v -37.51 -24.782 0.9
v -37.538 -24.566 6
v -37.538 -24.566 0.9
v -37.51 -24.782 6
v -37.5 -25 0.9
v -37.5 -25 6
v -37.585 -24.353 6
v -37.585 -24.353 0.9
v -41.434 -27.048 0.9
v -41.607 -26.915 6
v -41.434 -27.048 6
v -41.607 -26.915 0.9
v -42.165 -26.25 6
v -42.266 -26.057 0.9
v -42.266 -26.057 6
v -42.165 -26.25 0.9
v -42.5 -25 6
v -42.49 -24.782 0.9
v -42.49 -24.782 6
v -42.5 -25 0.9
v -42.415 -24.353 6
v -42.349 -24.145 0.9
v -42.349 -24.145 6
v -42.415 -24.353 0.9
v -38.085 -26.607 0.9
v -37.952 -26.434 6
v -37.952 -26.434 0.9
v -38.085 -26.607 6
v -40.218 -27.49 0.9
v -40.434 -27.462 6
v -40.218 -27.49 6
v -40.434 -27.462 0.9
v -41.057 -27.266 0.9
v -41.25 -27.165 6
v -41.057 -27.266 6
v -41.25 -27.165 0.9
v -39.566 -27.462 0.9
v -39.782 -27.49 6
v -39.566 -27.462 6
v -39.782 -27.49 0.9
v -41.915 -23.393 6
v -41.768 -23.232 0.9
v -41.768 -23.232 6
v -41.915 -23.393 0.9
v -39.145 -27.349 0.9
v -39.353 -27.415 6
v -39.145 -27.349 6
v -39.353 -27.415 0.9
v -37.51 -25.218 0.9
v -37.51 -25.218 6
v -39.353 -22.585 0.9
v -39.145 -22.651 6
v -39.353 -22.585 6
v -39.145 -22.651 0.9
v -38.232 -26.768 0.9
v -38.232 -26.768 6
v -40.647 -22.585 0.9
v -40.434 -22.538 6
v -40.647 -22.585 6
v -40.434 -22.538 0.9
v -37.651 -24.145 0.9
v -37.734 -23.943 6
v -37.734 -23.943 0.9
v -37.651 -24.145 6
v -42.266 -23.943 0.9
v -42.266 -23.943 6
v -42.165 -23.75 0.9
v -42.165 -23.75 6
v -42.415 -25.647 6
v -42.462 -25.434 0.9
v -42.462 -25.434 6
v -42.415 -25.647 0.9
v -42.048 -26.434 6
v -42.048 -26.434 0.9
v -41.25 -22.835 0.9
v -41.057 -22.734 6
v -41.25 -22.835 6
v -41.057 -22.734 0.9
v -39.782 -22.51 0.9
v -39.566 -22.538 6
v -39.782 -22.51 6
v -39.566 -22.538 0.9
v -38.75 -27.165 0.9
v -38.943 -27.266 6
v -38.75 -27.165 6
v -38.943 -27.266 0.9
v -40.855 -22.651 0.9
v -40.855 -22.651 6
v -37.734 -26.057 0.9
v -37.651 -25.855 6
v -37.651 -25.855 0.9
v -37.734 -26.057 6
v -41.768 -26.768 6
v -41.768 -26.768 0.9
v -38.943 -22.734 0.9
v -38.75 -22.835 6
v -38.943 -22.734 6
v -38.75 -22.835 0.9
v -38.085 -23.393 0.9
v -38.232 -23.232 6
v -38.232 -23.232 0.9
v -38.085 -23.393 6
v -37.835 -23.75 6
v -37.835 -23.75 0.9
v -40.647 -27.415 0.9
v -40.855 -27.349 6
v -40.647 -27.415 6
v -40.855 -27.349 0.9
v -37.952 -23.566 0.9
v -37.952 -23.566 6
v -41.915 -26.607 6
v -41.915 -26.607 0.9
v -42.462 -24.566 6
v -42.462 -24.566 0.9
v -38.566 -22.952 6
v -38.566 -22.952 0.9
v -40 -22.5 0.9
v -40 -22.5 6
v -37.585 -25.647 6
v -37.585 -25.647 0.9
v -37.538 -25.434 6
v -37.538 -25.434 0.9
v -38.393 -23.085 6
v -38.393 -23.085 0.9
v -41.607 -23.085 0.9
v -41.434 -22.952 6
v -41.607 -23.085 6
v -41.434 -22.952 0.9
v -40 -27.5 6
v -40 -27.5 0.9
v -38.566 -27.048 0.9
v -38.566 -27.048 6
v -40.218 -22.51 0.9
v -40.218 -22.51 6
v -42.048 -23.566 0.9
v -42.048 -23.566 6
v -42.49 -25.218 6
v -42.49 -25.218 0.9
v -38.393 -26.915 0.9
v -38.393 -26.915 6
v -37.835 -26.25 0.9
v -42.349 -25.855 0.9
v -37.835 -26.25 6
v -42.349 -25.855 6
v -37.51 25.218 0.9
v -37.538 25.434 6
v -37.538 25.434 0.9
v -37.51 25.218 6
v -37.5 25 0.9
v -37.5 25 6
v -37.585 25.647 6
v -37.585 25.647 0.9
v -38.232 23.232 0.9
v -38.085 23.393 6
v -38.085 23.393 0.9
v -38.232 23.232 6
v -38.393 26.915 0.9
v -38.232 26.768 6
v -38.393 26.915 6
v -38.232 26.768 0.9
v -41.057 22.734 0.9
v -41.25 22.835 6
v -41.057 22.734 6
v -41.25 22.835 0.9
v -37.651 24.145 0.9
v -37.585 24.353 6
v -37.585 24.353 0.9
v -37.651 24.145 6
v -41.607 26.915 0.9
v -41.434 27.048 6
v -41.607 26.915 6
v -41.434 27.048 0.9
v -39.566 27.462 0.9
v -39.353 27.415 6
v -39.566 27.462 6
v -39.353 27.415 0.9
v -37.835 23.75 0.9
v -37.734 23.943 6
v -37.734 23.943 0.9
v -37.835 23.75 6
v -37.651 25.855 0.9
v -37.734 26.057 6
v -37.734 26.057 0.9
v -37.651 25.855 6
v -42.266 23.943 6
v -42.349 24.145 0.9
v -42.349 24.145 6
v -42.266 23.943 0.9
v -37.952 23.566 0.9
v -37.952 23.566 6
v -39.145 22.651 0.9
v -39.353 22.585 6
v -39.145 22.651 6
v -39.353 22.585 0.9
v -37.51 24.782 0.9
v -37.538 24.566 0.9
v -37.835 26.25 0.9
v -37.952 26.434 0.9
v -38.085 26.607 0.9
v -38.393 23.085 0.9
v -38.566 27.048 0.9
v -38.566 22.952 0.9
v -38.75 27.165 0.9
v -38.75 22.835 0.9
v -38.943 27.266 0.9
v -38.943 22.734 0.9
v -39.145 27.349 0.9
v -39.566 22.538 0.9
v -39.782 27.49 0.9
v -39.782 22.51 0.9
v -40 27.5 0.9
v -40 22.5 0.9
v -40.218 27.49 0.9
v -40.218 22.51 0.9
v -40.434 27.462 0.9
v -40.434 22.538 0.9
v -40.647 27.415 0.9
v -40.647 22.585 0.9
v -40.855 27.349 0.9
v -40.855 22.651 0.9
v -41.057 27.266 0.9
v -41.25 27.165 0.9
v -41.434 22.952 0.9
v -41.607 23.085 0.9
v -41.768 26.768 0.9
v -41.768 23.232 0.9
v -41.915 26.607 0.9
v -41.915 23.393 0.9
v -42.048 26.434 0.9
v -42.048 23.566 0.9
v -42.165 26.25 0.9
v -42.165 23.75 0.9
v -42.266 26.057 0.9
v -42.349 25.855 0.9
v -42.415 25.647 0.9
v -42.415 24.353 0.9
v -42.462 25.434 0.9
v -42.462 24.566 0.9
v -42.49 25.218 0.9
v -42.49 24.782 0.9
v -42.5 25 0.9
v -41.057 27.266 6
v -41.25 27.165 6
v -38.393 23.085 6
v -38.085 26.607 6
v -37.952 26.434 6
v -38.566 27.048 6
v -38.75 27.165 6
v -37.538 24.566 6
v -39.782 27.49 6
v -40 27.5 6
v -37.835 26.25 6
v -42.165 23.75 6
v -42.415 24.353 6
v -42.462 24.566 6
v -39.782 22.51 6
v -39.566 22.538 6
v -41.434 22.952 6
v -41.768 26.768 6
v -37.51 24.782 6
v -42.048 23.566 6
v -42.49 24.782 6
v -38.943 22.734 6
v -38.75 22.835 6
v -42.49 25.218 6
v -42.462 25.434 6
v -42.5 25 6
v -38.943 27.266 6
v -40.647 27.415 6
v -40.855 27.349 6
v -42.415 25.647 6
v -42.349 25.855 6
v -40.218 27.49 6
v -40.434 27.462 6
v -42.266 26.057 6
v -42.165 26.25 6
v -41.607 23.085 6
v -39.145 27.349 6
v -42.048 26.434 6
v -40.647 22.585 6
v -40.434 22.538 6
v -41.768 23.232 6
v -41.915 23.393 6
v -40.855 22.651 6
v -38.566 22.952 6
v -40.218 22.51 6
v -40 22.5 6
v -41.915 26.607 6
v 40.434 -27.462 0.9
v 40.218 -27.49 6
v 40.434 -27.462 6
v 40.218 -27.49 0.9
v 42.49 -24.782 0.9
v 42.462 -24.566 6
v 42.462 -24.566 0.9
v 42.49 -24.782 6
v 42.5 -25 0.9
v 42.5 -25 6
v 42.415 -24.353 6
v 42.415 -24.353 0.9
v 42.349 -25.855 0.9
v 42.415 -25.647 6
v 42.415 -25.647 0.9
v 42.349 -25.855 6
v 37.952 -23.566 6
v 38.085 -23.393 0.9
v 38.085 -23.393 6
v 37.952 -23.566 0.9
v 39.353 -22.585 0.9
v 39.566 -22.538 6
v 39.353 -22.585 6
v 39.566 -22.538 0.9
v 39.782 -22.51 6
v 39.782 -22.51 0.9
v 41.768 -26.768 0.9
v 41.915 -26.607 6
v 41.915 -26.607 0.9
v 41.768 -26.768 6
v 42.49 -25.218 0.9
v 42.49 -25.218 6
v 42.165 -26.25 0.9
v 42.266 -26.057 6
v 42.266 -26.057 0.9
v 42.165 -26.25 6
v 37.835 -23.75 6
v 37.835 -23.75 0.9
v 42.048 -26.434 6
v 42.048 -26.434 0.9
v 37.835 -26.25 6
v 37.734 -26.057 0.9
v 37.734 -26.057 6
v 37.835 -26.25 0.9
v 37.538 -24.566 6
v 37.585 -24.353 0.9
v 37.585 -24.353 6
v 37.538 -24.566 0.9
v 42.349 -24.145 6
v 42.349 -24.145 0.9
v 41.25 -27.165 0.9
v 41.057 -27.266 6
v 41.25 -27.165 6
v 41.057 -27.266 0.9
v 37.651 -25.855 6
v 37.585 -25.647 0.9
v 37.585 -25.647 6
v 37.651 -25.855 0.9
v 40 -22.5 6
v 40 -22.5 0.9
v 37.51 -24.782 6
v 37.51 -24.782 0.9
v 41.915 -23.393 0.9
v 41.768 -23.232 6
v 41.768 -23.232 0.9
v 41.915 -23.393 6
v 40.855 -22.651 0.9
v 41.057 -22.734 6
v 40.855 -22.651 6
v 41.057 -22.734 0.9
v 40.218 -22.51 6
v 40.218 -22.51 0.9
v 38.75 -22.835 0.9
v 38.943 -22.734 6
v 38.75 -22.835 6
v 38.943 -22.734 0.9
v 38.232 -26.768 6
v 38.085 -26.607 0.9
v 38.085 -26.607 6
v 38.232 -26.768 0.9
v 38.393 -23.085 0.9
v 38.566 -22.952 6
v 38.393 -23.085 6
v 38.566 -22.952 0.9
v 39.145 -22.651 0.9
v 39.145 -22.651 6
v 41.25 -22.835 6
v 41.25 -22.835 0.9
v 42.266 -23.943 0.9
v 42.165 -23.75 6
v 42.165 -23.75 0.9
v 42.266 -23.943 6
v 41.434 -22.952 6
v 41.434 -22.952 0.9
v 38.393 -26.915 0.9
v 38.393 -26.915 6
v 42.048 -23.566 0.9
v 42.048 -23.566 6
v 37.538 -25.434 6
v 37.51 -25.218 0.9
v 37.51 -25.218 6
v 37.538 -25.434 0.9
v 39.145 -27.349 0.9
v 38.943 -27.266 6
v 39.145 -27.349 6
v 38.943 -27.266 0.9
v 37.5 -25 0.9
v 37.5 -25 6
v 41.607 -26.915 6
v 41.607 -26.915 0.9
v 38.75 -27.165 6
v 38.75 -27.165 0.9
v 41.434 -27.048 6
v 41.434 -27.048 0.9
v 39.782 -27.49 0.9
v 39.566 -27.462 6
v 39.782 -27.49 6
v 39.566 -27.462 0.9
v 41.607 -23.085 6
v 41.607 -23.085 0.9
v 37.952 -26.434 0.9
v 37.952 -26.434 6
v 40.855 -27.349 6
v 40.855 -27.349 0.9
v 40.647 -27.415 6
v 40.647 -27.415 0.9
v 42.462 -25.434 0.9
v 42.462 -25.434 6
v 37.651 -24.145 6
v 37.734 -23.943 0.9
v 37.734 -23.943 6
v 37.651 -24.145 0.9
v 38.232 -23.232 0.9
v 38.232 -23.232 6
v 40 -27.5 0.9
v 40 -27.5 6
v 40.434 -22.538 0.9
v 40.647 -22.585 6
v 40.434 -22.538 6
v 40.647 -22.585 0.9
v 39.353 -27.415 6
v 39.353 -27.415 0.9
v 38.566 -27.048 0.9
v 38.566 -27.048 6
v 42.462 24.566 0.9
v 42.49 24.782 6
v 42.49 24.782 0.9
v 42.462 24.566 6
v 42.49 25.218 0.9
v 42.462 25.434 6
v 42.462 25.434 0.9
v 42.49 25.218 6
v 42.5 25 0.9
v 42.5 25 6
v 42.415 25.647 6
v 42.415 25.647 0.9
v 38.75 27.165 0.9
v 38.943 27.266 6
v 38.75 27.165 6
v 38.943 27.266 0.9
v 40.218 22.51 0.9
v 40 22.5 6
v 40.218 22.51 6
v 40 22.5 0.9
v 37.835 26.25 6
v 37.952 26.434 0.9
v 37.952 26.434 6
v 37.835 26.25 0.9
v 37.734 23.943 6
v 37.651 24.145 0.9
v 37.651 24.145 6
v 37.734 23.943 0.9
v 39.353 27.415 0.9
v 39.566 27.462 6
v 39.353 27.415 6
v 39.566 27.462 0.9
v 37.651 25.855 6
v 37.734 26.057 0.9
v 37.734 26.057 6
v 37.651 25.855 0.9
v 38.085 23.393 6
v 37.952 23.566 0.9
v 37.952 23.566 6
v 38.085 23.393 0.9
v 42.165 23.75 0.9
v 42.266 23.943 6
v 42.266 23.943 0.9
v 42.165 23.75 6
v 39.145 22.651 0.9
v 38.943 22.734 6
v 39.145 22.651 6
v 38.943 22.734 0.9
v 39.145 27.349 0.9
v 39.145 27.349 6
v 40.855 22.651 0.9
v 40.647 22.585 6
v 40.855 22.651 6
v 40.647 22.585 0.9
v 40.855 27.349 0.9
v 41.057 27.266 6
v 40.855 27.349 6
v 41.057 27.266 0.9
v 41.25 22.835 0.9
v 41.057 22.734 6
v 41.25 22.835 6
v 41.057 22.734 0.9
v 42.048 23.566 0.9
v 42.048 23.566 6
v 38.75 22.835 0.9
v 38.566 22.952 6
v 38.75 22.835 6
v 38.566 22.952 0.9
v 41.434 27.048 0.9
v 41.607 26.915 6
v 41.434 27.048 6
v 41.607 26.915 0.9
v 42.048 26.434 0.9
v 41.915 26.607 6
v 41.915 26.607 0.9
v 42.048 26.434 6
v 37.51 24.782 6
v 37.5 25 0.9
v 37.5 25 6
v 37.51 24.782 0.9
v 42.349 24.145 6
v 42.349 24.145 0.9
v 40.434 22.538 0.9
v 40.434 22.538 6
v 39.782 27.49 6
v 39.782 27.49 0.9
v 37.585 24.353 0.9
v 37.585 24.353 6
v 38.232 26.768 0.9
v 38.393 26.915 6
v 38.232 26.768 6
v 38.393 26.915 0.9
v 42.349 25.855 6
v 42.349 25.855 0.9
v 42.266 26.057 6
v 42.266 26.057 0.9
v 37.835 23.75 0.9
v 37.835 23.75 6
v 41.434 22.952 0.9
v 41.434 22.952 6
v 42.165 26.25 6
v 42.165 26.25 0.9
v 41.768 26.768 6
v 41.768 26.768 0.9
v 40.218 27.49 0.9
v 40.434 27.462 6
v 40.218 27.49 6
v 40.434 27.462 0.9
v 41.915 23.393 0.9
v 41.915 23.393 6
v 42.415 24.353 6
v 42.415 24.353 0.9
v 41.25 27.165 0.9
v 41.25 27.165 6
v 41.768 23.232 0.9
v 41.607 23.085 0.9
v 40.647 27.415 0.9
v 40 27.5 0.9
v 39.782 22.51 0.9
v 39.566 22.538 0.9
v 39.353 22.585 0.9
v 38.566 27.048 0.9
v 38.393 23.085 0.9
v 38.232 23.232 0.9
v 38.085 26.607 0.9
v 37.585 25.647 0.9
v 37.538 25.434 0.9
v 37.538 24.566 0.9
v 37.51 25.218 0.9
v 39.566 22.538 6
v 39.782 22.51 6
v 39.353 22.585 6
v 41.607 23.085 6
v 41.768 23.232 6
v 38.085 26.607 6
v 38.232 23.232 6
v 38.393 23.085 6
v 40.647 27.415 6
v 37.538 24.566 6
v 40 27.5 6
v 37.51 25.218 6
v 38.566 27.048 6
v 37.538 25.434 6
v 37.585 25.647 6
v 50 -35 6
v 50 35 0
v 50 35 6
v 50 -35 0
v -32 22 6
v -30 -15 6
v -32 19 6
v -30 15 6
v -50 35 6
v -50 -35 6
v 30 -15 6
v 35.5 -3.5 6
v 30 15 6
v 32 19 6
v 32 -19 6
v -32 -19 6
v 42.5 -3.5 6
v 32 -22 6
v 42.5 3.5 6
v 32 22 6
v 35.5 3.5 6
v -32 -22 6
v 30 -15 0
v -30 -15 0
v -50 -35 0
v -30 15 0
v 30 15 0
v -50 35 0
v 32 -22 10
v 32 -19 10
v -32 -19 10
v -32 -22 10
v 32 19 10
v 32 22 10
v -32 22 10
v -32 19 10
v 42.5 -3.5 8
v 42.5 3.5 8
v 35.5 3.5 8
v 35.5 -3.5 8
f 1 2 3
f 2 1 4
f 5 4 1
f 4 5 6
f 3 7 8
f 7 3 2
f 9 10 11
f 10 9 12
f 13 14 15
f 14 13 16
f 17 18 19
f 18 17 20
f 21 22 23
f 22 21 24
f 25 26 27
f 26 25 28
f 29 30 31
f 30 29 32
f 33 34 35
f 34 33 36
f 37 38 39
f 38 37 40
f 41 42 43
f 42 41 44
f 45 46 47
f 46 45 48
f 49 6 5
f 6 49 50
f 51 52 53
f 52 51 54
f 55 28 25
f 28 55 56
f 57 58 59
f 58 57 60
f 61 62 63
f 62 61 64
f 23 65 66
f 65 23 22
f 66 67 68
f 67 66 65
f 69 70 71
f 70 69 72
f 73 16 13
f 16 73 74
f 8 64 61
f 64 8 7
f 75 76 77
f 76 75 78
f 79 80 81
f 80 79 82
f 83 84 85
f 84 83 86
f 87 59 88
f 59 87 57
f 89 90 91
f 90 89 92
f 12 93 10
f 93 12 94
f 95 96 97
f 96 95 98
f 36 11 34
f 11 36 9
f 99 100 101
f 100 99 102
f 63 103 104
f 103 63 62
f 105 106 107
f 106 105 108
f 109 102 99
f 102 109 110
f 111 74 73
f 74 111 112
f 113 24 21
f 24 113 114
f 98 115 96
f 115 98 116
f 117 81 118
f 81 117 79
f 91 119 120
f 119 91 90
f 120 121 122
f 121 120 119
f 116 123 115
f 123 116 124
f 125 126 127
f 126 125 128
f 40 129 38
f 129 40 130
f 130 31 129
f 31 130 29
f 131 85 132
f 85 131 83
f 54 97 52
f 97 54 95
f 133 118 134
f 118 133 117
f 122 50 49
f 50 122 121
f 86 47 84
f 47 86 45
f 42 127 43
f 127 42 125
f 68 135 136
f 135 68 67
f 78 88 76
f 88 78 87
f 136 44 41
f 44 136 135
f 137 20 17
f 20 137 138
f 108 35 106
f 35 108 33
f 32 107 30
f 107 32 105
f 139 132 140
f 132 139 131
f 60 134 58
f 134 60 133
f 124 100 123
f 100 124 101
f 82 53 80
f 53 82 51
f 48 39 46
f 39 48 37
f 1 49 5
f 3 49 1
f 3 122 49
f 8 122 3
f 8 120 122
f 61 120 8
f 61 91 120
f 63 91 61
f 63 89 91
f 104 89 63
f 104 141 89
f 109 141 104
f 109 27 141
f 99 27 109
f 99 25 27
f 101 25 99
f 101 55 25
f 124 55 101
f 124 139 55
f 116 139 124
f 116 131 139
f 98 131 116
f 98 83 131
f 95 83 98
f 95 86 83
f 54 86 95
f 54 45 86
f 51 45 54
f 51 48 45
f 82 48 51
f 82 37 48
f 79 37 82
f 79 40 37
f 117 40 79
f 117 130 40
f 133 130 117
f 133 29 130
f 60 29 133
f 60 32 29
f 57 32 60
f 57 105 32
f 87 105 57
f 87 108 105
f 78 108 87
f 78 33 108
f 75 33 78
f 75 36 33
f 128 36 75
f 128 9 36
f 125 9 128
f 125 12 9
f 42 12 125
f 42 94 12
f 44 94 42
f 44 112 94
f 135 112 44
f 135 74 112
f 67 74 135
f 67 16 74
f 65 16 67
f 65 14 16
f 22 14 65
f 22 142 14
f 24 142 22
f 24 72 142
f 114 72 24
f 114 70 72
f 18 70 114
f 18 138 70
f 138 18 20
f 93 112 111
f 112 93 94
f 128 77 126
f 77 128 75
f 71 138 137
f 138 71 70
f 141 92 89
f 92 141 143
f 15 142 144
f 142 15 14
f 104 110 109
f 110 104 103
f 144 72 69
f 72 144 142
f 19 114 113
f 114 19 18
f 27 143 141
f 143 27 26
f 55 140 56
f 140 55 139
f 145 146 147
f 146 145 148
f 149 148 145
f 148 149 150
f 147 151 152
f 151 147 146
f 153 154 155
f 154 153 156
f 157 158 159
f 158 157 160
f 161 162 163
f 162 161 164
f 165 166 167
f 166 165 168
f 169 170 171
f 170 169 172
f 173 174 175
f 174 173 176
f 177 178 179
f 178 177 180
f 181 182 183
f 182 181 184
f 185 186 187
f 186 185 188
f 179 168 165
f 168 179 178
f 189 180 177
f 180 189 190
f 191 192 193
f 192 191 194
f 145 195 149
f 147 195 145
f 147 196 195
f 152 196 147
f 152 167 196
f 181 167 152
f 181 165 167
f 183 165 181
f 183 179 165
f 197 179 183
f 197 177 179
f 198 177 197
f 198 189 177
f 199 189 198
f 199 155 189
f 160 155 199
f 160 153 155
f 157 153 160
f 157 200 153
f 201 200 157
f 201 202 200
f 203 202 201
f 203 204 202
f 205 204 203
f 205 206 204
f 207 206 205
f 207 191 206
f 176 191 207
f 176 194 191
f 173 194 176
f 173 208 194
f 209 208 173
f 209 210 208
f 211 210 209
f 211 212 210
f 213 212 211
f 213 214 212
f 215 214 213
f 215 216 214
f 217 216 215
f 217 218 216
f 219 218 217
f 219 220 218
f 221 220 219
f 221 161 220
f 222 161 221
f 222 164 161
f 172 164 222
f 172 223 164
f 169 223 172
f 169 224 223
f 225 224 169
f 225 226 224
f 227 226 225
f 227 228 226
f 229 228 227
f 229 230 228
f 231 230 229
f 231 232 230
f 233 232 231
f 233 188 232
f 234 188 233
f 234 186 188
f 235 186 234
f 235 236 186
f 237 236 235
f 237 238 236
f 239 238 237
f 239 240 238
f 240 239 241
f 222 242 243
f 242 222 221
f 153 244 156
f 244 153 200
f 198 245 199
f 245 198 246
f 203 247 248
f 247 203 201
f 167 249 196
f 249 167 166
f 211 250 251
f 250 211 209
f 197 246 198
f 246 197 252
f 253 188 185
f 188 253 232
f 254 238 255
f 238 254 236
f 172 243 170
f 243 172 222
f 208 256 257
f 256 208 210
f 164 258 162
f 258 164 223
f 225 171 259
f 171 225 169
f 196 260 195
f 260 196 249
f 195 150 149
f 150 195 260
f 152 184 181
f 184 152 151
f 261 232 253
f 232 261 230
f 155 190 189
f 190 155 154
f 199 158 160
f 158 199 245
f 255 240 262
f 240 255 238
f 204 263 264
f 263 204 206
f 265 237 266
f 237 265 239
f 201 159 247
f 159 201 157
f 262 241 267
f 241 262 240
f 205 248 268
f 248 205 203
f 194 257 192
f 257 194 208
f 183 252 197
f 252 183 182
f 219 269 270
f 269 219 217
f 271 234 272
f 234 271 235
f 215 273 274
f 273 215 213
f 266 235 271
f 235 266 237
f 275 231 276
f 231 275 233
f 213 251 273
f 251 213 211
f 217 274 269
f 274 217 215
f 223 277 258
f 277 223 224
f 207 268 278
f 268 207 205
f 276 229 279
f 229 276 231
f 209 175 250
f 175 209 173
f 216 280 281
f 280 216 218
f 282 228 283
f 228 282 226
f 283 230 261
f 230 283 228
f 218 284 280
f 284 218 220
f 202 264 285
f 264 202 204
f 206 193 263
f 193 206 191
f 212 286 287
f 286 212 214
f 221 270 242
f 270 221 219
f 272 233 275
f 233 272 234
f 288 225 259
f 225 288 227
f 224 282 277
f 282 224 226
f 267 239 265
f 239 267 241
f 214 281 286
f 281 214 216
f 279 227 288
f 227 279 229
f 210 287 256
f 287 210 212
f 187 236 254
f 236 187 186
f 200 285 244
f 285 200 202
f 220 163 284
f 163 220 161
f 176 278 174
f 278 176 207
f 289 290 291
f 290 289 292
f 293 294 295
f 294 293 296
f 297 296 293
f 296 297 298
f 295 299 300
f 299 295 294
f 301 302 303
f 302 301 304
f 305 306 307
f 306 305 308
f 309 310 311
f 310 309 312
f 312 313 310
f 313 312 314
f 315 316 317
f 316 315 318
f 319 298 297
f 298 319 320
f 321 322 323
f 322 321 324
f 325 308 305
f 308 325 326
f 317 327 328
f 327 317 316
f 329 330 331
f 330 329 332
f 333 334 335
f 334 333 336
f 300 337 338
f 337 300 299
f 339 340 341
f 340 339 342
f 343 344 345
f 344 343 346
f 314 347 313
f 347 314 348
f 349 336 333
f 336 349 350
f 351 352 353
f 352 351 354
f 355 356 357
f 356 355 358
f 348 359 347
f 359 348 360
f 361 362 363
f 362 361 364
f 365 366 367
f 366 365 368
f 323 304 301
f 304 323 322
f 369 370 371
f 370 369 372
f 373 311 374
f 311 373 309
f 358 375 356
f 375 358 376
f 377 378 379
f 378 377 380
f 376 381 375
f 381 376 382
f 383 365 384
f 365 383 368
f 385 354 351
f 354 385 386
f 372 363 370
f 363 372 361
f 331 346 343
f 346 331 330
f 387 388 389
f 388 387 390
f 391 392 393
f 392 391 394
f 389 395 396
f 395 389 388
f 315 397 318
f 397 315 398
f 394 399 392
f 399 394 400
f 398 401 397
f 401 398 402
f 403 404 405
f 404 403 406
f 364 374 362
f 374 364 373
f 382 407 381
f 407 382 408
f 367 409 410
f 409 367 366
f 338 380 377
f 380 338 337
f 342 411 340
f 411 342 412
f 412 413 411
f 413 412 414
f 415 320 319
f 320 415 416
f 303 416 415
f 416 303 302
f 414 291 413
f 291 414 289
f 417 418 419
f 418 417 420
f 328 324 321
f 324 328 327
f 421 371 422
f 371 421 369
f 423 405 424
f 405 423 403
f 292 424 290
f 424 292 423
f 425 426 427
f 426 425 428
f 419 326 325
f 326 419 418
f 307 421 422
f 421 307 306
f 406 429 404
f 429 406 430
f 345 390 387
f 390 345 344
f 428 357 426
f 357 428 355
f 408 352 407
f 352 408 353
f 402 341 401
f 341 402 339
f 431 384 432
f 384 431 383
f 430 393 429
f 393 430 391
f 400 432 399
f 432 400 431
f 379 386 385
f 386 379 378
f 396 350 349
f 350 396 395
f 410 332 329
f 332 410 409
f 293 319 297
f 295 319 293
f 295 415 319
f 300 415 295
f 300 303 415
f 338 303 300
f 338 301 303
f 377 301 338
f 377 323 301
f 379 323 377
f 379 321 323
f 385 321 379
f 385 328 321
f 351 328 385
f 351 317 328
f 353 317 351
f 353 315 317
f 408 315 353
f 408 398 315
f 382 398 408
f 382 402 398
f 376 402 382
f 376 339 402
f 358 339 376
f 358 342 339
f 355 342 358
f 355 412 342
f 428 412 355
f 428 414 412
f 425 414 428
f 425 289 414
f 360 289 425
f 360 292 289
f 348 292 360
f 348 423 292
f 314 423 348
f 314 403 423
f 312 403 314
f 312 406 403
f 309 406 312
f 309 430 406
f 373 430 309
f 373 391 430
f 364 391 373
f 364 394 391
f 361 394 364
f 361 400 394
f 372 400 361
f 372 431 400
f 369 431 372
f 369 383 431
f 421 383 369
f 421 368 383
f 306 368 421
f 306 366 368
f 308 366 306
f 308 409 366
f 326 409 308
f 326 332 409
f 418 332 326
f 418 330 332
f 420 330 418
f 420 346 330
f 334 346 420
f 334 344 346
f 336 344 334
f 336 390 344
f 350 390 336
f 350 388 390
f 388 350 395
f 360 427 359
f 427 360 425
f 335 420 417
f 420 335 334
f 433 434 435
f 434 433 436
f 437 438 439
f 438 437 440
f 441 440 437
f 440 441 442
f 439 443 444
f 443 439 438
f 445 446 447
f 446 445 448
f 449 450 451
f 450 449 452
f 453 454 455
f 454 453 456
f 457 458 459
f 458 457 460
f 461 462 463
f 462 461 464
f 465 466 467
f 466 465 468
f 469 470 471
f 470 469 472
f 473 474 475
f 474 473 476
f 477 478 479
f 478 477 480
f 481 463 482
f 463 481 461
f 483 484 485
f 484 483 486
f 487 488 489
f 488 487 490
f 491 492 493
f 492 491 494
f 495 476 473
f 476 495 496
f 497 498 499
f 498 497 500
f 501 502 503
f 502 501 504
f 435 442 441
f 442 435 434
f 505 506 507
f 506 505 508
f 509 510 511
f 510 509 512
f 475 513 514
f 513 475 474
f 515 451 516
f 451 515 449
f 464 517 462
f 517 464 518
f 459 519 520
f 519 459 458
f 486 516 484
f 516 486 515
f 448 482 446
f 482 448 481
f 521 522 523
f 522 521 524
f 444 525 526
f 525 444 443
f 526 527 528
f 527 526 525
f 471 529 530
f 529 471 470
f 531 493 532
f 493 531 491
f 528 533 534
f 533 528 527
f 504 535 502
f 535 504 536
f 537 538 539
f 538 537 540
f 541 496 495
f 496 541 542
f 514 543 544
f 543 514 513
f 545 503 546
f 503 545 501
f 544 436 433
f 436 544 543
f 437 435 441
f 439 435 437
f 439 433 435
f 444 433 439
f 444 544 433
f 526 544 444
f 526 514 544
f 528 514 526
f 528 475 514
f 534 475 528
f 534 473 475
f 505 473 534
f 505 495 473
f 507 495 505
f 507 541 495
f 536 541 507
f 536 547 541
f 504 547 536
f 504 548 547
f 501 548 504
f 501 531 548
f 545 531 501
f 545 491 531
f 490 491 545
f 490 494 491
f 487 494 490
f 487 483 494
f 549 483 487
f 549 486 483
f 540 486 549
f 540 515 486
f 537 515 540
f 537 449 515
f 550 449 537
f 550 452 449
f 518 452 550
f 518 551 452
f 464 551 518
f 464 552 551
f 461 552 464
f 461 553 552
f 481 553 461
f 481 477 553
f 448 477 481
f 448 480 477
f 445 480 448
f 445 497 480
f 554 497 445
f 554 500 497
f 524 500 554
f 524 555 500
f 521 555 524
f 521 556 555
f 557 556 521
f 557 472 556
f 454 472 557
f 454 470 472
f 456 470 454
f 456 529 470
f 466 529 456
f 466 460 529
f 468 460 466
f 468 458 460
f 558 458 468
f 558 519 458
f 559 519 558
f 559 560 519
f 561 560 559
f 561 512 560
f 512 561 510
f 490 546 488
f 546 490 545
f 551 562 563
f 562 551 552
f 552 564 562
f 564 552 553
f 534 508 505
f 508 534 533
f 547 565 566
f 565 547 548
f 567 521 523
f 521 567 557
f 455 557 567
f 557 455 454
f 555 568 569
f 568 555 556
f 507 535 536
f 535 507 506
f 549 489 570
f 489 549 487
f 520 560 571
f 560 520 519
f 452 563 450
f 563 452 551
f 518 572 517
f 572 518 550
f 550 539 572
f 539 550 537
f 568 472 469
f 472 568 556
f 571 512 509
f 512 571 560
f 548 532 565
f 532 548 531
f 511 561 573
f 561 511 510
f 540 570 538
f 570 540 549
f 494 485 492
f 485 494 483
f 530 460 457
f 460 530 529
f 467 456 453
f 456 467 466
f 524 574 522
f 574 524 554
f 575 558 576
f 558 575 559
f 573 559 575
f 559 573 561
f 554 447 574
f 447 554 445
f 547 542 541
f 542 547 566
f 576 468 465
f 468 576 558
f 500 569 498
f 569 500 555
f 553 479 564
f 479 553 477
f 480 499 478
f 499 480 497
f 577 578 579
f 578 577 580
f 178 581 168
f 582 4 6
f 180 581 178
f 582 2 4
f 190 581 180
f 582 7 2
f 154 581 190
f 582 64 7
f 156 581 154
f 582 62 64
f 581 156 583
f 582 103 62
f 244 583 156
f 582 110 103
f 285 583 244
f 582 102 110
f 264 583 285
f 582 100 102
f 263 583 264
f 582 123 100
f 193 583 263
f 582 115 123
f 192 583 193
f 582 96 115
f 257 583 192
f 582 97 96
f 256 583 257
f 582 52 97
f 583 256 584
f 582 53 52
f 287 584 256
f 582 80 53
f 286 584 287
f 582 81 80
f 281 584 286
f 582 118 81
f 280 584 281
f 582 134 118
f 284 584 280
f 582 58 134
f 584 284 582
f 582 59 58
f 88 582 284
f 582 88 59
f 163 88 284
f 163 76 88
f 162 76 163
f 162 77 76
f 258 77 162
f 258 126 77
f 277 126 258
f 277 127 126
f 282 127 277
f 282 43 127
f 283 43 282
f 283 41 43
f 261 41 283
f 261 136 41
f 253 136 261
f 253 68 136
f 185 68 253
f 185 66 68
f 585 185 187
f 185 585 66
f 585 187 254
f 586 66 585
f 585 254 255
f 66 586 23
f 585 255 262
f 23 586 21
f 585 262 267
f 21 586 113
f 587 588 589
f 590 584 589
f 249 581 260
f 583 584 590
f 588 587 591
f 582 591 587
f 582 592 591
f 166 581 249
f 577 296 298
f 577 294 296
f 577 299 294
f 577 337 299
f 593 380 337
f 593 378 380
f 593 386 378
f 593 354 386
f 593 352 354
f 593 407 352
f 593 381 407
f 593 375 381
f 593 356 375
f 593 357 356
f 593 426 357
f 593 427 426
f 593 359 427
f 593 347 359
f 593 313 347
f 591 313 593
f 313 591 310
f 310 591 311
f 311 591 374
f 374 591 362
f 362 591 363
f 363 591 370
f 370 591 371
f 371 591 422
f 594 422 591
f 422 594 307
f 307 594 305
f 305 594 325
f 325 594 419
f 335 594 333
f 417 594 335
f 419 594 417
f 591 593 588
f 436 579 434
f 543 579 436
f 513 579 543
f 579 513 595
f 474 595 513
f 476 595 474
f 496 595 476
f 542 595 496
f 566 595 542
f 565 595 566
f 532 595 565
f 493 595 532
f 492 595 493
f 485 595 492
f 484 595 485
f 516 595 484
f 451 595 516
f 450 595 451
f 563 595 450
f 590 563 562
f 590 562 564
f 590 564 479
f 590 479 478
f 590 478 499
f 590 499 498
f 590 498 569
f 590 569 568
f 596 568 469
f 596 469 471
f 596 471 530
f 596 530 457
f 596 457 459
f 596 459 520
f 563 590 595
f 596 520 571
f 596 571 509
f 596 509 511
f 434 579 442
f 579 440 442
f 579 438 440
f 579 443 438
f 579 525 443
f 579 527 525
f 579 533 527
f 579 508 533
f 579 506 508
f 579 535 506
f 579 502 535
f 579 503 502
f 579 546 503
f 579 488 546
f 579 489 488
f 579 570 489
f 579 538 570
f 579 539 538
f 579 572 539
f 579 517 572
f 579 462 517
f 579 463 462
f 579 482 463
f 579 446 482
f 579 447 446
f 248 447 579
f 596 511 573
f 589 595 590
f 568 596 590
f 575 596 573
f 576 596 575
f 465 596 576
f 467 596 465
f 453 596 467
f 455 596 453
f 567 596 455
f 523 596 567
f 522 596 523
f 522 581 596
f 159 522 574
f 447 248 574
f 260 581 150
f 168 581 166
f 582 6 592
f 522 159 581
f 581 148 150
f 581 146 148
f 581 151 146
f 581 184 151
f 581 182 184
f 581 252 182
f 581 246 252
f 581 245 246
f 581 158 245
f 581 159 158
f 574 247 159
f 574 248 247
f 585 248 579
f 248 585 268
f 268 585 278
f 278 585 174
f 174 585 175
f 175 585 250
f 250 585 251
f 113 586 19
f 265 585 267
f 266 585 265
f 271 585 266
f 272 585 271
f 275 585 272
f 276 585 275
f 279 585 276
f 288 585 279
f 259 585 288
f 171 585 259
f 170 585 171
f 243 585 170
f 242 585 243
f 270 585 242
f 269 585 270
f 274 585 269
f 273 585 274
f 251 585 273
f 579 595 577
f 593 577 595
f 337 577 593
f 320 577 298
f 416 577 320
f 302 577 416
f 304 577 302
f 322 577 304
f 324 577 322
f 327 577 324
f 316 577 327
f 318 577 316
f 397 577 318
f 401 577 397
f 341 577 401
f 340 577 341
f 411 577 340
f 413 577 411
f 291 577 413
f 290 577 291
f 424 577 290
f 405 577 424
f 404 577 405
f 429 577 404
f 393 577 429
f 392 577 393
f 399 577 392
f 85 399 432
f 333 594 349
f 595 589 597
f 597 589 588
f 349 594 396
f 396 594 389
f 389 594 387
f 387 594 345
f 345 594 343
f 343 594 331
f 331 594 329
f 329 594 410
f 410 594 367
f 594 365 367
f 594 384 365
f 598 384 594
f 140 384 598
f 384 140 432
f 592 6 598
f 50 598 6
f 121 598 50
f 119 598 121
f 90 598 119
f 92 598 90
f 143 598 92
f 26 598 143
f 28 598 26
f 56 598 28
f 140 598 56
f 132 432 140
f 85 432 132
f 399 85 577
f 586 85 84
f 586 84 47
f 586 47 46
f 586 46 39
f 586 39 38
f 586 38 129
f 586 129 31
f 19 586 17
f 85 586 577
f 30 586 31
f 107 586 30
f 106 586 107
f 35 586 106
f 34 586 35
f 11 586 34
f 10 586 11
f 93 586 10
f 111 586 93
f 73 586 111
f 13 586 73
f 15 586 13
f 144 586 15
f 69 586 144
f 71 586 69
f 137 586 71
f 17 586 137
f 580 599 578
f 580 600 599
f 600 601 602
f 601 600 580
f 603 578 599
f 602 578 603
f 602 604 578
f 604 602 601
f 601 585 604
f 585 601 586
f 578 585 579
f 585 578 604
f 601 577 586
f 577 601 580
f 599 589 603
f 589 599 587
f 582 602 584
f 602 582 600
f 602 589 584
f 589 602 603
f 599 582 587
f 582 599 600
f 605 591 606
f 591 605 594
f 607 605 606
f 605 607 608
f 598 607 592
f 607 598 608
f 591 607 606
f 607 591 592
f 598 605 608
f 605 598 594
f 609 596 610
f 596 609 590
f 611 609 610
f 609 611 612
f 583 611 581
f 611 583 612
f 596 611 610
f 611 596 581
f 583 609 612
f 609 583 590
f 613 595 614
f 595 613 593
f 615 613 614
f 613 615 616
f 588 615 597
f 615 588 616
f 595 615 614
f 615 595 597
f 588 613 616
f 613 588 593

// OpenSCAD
// Microfluidic chip imaging holder — reference solution
// Category: tools; purpose: repeatable positioning during optical chip imaging
// Print on flat base with z=0 on bed; PLA/PETG, no supports; not certified for clinical or sterile use
// SPDX-License-Identifier: CERN-OHL-P-2.0
$fn=72;
eps=0.05;
base_x=100;
base_y=70;
base_h=6;
window_x=60;
window_y=30;
hole_d=5;
hole_pitch_x=80;
hole_pitch_y=50;
rail_len=64;
rail_width=3;
rail_h=4;
rail_center_y=20.5;
marker_x=7;
marker_y=7;
marker_h=2;
marker_center_x=39;
assert(base_x > window_x + 2*hole_d);
assert(base_y > window_y + 2*hole_d);
assert(hole_pitch_x/2+hole_d/2 < base_x/2);
assert(hole_pitch_y/2+hole_d/2 < base_y/2);
assert(rail_center_y - rail_width/2 > window_y/2);
module reference(){
 union(){
  difference(){
   translate([-base_x/2,-base_y/2,0]) cube([base_x,base_y,base_h]);
   translate([-window_x/2,-window_y/2,-eps]) cube([window_x,window_y,base_h+2*eps]);
   for(x=[-hole_pitch_x/2,hole_pitch_x/2])
    for(y=[-hole_pitch_y/2,hole_pitch_y/2])
     translate([x,y,0.9]) cylinder(d=hole_d,h=base_h+2*eps);
  }
  for(y=[-rail_center_y,rail_center_y])
   translate([-rail_len/2,y-rail_width/2,base_h-eps])
    cube([rail_len,rail_width,rail_h+eps]);
  translate([marker_center_x-marker_x/2,-marker_y/2,base_h-eps])
   cube([marker_x,marker_y,marker_h+eps]);
 }
}
reference();
